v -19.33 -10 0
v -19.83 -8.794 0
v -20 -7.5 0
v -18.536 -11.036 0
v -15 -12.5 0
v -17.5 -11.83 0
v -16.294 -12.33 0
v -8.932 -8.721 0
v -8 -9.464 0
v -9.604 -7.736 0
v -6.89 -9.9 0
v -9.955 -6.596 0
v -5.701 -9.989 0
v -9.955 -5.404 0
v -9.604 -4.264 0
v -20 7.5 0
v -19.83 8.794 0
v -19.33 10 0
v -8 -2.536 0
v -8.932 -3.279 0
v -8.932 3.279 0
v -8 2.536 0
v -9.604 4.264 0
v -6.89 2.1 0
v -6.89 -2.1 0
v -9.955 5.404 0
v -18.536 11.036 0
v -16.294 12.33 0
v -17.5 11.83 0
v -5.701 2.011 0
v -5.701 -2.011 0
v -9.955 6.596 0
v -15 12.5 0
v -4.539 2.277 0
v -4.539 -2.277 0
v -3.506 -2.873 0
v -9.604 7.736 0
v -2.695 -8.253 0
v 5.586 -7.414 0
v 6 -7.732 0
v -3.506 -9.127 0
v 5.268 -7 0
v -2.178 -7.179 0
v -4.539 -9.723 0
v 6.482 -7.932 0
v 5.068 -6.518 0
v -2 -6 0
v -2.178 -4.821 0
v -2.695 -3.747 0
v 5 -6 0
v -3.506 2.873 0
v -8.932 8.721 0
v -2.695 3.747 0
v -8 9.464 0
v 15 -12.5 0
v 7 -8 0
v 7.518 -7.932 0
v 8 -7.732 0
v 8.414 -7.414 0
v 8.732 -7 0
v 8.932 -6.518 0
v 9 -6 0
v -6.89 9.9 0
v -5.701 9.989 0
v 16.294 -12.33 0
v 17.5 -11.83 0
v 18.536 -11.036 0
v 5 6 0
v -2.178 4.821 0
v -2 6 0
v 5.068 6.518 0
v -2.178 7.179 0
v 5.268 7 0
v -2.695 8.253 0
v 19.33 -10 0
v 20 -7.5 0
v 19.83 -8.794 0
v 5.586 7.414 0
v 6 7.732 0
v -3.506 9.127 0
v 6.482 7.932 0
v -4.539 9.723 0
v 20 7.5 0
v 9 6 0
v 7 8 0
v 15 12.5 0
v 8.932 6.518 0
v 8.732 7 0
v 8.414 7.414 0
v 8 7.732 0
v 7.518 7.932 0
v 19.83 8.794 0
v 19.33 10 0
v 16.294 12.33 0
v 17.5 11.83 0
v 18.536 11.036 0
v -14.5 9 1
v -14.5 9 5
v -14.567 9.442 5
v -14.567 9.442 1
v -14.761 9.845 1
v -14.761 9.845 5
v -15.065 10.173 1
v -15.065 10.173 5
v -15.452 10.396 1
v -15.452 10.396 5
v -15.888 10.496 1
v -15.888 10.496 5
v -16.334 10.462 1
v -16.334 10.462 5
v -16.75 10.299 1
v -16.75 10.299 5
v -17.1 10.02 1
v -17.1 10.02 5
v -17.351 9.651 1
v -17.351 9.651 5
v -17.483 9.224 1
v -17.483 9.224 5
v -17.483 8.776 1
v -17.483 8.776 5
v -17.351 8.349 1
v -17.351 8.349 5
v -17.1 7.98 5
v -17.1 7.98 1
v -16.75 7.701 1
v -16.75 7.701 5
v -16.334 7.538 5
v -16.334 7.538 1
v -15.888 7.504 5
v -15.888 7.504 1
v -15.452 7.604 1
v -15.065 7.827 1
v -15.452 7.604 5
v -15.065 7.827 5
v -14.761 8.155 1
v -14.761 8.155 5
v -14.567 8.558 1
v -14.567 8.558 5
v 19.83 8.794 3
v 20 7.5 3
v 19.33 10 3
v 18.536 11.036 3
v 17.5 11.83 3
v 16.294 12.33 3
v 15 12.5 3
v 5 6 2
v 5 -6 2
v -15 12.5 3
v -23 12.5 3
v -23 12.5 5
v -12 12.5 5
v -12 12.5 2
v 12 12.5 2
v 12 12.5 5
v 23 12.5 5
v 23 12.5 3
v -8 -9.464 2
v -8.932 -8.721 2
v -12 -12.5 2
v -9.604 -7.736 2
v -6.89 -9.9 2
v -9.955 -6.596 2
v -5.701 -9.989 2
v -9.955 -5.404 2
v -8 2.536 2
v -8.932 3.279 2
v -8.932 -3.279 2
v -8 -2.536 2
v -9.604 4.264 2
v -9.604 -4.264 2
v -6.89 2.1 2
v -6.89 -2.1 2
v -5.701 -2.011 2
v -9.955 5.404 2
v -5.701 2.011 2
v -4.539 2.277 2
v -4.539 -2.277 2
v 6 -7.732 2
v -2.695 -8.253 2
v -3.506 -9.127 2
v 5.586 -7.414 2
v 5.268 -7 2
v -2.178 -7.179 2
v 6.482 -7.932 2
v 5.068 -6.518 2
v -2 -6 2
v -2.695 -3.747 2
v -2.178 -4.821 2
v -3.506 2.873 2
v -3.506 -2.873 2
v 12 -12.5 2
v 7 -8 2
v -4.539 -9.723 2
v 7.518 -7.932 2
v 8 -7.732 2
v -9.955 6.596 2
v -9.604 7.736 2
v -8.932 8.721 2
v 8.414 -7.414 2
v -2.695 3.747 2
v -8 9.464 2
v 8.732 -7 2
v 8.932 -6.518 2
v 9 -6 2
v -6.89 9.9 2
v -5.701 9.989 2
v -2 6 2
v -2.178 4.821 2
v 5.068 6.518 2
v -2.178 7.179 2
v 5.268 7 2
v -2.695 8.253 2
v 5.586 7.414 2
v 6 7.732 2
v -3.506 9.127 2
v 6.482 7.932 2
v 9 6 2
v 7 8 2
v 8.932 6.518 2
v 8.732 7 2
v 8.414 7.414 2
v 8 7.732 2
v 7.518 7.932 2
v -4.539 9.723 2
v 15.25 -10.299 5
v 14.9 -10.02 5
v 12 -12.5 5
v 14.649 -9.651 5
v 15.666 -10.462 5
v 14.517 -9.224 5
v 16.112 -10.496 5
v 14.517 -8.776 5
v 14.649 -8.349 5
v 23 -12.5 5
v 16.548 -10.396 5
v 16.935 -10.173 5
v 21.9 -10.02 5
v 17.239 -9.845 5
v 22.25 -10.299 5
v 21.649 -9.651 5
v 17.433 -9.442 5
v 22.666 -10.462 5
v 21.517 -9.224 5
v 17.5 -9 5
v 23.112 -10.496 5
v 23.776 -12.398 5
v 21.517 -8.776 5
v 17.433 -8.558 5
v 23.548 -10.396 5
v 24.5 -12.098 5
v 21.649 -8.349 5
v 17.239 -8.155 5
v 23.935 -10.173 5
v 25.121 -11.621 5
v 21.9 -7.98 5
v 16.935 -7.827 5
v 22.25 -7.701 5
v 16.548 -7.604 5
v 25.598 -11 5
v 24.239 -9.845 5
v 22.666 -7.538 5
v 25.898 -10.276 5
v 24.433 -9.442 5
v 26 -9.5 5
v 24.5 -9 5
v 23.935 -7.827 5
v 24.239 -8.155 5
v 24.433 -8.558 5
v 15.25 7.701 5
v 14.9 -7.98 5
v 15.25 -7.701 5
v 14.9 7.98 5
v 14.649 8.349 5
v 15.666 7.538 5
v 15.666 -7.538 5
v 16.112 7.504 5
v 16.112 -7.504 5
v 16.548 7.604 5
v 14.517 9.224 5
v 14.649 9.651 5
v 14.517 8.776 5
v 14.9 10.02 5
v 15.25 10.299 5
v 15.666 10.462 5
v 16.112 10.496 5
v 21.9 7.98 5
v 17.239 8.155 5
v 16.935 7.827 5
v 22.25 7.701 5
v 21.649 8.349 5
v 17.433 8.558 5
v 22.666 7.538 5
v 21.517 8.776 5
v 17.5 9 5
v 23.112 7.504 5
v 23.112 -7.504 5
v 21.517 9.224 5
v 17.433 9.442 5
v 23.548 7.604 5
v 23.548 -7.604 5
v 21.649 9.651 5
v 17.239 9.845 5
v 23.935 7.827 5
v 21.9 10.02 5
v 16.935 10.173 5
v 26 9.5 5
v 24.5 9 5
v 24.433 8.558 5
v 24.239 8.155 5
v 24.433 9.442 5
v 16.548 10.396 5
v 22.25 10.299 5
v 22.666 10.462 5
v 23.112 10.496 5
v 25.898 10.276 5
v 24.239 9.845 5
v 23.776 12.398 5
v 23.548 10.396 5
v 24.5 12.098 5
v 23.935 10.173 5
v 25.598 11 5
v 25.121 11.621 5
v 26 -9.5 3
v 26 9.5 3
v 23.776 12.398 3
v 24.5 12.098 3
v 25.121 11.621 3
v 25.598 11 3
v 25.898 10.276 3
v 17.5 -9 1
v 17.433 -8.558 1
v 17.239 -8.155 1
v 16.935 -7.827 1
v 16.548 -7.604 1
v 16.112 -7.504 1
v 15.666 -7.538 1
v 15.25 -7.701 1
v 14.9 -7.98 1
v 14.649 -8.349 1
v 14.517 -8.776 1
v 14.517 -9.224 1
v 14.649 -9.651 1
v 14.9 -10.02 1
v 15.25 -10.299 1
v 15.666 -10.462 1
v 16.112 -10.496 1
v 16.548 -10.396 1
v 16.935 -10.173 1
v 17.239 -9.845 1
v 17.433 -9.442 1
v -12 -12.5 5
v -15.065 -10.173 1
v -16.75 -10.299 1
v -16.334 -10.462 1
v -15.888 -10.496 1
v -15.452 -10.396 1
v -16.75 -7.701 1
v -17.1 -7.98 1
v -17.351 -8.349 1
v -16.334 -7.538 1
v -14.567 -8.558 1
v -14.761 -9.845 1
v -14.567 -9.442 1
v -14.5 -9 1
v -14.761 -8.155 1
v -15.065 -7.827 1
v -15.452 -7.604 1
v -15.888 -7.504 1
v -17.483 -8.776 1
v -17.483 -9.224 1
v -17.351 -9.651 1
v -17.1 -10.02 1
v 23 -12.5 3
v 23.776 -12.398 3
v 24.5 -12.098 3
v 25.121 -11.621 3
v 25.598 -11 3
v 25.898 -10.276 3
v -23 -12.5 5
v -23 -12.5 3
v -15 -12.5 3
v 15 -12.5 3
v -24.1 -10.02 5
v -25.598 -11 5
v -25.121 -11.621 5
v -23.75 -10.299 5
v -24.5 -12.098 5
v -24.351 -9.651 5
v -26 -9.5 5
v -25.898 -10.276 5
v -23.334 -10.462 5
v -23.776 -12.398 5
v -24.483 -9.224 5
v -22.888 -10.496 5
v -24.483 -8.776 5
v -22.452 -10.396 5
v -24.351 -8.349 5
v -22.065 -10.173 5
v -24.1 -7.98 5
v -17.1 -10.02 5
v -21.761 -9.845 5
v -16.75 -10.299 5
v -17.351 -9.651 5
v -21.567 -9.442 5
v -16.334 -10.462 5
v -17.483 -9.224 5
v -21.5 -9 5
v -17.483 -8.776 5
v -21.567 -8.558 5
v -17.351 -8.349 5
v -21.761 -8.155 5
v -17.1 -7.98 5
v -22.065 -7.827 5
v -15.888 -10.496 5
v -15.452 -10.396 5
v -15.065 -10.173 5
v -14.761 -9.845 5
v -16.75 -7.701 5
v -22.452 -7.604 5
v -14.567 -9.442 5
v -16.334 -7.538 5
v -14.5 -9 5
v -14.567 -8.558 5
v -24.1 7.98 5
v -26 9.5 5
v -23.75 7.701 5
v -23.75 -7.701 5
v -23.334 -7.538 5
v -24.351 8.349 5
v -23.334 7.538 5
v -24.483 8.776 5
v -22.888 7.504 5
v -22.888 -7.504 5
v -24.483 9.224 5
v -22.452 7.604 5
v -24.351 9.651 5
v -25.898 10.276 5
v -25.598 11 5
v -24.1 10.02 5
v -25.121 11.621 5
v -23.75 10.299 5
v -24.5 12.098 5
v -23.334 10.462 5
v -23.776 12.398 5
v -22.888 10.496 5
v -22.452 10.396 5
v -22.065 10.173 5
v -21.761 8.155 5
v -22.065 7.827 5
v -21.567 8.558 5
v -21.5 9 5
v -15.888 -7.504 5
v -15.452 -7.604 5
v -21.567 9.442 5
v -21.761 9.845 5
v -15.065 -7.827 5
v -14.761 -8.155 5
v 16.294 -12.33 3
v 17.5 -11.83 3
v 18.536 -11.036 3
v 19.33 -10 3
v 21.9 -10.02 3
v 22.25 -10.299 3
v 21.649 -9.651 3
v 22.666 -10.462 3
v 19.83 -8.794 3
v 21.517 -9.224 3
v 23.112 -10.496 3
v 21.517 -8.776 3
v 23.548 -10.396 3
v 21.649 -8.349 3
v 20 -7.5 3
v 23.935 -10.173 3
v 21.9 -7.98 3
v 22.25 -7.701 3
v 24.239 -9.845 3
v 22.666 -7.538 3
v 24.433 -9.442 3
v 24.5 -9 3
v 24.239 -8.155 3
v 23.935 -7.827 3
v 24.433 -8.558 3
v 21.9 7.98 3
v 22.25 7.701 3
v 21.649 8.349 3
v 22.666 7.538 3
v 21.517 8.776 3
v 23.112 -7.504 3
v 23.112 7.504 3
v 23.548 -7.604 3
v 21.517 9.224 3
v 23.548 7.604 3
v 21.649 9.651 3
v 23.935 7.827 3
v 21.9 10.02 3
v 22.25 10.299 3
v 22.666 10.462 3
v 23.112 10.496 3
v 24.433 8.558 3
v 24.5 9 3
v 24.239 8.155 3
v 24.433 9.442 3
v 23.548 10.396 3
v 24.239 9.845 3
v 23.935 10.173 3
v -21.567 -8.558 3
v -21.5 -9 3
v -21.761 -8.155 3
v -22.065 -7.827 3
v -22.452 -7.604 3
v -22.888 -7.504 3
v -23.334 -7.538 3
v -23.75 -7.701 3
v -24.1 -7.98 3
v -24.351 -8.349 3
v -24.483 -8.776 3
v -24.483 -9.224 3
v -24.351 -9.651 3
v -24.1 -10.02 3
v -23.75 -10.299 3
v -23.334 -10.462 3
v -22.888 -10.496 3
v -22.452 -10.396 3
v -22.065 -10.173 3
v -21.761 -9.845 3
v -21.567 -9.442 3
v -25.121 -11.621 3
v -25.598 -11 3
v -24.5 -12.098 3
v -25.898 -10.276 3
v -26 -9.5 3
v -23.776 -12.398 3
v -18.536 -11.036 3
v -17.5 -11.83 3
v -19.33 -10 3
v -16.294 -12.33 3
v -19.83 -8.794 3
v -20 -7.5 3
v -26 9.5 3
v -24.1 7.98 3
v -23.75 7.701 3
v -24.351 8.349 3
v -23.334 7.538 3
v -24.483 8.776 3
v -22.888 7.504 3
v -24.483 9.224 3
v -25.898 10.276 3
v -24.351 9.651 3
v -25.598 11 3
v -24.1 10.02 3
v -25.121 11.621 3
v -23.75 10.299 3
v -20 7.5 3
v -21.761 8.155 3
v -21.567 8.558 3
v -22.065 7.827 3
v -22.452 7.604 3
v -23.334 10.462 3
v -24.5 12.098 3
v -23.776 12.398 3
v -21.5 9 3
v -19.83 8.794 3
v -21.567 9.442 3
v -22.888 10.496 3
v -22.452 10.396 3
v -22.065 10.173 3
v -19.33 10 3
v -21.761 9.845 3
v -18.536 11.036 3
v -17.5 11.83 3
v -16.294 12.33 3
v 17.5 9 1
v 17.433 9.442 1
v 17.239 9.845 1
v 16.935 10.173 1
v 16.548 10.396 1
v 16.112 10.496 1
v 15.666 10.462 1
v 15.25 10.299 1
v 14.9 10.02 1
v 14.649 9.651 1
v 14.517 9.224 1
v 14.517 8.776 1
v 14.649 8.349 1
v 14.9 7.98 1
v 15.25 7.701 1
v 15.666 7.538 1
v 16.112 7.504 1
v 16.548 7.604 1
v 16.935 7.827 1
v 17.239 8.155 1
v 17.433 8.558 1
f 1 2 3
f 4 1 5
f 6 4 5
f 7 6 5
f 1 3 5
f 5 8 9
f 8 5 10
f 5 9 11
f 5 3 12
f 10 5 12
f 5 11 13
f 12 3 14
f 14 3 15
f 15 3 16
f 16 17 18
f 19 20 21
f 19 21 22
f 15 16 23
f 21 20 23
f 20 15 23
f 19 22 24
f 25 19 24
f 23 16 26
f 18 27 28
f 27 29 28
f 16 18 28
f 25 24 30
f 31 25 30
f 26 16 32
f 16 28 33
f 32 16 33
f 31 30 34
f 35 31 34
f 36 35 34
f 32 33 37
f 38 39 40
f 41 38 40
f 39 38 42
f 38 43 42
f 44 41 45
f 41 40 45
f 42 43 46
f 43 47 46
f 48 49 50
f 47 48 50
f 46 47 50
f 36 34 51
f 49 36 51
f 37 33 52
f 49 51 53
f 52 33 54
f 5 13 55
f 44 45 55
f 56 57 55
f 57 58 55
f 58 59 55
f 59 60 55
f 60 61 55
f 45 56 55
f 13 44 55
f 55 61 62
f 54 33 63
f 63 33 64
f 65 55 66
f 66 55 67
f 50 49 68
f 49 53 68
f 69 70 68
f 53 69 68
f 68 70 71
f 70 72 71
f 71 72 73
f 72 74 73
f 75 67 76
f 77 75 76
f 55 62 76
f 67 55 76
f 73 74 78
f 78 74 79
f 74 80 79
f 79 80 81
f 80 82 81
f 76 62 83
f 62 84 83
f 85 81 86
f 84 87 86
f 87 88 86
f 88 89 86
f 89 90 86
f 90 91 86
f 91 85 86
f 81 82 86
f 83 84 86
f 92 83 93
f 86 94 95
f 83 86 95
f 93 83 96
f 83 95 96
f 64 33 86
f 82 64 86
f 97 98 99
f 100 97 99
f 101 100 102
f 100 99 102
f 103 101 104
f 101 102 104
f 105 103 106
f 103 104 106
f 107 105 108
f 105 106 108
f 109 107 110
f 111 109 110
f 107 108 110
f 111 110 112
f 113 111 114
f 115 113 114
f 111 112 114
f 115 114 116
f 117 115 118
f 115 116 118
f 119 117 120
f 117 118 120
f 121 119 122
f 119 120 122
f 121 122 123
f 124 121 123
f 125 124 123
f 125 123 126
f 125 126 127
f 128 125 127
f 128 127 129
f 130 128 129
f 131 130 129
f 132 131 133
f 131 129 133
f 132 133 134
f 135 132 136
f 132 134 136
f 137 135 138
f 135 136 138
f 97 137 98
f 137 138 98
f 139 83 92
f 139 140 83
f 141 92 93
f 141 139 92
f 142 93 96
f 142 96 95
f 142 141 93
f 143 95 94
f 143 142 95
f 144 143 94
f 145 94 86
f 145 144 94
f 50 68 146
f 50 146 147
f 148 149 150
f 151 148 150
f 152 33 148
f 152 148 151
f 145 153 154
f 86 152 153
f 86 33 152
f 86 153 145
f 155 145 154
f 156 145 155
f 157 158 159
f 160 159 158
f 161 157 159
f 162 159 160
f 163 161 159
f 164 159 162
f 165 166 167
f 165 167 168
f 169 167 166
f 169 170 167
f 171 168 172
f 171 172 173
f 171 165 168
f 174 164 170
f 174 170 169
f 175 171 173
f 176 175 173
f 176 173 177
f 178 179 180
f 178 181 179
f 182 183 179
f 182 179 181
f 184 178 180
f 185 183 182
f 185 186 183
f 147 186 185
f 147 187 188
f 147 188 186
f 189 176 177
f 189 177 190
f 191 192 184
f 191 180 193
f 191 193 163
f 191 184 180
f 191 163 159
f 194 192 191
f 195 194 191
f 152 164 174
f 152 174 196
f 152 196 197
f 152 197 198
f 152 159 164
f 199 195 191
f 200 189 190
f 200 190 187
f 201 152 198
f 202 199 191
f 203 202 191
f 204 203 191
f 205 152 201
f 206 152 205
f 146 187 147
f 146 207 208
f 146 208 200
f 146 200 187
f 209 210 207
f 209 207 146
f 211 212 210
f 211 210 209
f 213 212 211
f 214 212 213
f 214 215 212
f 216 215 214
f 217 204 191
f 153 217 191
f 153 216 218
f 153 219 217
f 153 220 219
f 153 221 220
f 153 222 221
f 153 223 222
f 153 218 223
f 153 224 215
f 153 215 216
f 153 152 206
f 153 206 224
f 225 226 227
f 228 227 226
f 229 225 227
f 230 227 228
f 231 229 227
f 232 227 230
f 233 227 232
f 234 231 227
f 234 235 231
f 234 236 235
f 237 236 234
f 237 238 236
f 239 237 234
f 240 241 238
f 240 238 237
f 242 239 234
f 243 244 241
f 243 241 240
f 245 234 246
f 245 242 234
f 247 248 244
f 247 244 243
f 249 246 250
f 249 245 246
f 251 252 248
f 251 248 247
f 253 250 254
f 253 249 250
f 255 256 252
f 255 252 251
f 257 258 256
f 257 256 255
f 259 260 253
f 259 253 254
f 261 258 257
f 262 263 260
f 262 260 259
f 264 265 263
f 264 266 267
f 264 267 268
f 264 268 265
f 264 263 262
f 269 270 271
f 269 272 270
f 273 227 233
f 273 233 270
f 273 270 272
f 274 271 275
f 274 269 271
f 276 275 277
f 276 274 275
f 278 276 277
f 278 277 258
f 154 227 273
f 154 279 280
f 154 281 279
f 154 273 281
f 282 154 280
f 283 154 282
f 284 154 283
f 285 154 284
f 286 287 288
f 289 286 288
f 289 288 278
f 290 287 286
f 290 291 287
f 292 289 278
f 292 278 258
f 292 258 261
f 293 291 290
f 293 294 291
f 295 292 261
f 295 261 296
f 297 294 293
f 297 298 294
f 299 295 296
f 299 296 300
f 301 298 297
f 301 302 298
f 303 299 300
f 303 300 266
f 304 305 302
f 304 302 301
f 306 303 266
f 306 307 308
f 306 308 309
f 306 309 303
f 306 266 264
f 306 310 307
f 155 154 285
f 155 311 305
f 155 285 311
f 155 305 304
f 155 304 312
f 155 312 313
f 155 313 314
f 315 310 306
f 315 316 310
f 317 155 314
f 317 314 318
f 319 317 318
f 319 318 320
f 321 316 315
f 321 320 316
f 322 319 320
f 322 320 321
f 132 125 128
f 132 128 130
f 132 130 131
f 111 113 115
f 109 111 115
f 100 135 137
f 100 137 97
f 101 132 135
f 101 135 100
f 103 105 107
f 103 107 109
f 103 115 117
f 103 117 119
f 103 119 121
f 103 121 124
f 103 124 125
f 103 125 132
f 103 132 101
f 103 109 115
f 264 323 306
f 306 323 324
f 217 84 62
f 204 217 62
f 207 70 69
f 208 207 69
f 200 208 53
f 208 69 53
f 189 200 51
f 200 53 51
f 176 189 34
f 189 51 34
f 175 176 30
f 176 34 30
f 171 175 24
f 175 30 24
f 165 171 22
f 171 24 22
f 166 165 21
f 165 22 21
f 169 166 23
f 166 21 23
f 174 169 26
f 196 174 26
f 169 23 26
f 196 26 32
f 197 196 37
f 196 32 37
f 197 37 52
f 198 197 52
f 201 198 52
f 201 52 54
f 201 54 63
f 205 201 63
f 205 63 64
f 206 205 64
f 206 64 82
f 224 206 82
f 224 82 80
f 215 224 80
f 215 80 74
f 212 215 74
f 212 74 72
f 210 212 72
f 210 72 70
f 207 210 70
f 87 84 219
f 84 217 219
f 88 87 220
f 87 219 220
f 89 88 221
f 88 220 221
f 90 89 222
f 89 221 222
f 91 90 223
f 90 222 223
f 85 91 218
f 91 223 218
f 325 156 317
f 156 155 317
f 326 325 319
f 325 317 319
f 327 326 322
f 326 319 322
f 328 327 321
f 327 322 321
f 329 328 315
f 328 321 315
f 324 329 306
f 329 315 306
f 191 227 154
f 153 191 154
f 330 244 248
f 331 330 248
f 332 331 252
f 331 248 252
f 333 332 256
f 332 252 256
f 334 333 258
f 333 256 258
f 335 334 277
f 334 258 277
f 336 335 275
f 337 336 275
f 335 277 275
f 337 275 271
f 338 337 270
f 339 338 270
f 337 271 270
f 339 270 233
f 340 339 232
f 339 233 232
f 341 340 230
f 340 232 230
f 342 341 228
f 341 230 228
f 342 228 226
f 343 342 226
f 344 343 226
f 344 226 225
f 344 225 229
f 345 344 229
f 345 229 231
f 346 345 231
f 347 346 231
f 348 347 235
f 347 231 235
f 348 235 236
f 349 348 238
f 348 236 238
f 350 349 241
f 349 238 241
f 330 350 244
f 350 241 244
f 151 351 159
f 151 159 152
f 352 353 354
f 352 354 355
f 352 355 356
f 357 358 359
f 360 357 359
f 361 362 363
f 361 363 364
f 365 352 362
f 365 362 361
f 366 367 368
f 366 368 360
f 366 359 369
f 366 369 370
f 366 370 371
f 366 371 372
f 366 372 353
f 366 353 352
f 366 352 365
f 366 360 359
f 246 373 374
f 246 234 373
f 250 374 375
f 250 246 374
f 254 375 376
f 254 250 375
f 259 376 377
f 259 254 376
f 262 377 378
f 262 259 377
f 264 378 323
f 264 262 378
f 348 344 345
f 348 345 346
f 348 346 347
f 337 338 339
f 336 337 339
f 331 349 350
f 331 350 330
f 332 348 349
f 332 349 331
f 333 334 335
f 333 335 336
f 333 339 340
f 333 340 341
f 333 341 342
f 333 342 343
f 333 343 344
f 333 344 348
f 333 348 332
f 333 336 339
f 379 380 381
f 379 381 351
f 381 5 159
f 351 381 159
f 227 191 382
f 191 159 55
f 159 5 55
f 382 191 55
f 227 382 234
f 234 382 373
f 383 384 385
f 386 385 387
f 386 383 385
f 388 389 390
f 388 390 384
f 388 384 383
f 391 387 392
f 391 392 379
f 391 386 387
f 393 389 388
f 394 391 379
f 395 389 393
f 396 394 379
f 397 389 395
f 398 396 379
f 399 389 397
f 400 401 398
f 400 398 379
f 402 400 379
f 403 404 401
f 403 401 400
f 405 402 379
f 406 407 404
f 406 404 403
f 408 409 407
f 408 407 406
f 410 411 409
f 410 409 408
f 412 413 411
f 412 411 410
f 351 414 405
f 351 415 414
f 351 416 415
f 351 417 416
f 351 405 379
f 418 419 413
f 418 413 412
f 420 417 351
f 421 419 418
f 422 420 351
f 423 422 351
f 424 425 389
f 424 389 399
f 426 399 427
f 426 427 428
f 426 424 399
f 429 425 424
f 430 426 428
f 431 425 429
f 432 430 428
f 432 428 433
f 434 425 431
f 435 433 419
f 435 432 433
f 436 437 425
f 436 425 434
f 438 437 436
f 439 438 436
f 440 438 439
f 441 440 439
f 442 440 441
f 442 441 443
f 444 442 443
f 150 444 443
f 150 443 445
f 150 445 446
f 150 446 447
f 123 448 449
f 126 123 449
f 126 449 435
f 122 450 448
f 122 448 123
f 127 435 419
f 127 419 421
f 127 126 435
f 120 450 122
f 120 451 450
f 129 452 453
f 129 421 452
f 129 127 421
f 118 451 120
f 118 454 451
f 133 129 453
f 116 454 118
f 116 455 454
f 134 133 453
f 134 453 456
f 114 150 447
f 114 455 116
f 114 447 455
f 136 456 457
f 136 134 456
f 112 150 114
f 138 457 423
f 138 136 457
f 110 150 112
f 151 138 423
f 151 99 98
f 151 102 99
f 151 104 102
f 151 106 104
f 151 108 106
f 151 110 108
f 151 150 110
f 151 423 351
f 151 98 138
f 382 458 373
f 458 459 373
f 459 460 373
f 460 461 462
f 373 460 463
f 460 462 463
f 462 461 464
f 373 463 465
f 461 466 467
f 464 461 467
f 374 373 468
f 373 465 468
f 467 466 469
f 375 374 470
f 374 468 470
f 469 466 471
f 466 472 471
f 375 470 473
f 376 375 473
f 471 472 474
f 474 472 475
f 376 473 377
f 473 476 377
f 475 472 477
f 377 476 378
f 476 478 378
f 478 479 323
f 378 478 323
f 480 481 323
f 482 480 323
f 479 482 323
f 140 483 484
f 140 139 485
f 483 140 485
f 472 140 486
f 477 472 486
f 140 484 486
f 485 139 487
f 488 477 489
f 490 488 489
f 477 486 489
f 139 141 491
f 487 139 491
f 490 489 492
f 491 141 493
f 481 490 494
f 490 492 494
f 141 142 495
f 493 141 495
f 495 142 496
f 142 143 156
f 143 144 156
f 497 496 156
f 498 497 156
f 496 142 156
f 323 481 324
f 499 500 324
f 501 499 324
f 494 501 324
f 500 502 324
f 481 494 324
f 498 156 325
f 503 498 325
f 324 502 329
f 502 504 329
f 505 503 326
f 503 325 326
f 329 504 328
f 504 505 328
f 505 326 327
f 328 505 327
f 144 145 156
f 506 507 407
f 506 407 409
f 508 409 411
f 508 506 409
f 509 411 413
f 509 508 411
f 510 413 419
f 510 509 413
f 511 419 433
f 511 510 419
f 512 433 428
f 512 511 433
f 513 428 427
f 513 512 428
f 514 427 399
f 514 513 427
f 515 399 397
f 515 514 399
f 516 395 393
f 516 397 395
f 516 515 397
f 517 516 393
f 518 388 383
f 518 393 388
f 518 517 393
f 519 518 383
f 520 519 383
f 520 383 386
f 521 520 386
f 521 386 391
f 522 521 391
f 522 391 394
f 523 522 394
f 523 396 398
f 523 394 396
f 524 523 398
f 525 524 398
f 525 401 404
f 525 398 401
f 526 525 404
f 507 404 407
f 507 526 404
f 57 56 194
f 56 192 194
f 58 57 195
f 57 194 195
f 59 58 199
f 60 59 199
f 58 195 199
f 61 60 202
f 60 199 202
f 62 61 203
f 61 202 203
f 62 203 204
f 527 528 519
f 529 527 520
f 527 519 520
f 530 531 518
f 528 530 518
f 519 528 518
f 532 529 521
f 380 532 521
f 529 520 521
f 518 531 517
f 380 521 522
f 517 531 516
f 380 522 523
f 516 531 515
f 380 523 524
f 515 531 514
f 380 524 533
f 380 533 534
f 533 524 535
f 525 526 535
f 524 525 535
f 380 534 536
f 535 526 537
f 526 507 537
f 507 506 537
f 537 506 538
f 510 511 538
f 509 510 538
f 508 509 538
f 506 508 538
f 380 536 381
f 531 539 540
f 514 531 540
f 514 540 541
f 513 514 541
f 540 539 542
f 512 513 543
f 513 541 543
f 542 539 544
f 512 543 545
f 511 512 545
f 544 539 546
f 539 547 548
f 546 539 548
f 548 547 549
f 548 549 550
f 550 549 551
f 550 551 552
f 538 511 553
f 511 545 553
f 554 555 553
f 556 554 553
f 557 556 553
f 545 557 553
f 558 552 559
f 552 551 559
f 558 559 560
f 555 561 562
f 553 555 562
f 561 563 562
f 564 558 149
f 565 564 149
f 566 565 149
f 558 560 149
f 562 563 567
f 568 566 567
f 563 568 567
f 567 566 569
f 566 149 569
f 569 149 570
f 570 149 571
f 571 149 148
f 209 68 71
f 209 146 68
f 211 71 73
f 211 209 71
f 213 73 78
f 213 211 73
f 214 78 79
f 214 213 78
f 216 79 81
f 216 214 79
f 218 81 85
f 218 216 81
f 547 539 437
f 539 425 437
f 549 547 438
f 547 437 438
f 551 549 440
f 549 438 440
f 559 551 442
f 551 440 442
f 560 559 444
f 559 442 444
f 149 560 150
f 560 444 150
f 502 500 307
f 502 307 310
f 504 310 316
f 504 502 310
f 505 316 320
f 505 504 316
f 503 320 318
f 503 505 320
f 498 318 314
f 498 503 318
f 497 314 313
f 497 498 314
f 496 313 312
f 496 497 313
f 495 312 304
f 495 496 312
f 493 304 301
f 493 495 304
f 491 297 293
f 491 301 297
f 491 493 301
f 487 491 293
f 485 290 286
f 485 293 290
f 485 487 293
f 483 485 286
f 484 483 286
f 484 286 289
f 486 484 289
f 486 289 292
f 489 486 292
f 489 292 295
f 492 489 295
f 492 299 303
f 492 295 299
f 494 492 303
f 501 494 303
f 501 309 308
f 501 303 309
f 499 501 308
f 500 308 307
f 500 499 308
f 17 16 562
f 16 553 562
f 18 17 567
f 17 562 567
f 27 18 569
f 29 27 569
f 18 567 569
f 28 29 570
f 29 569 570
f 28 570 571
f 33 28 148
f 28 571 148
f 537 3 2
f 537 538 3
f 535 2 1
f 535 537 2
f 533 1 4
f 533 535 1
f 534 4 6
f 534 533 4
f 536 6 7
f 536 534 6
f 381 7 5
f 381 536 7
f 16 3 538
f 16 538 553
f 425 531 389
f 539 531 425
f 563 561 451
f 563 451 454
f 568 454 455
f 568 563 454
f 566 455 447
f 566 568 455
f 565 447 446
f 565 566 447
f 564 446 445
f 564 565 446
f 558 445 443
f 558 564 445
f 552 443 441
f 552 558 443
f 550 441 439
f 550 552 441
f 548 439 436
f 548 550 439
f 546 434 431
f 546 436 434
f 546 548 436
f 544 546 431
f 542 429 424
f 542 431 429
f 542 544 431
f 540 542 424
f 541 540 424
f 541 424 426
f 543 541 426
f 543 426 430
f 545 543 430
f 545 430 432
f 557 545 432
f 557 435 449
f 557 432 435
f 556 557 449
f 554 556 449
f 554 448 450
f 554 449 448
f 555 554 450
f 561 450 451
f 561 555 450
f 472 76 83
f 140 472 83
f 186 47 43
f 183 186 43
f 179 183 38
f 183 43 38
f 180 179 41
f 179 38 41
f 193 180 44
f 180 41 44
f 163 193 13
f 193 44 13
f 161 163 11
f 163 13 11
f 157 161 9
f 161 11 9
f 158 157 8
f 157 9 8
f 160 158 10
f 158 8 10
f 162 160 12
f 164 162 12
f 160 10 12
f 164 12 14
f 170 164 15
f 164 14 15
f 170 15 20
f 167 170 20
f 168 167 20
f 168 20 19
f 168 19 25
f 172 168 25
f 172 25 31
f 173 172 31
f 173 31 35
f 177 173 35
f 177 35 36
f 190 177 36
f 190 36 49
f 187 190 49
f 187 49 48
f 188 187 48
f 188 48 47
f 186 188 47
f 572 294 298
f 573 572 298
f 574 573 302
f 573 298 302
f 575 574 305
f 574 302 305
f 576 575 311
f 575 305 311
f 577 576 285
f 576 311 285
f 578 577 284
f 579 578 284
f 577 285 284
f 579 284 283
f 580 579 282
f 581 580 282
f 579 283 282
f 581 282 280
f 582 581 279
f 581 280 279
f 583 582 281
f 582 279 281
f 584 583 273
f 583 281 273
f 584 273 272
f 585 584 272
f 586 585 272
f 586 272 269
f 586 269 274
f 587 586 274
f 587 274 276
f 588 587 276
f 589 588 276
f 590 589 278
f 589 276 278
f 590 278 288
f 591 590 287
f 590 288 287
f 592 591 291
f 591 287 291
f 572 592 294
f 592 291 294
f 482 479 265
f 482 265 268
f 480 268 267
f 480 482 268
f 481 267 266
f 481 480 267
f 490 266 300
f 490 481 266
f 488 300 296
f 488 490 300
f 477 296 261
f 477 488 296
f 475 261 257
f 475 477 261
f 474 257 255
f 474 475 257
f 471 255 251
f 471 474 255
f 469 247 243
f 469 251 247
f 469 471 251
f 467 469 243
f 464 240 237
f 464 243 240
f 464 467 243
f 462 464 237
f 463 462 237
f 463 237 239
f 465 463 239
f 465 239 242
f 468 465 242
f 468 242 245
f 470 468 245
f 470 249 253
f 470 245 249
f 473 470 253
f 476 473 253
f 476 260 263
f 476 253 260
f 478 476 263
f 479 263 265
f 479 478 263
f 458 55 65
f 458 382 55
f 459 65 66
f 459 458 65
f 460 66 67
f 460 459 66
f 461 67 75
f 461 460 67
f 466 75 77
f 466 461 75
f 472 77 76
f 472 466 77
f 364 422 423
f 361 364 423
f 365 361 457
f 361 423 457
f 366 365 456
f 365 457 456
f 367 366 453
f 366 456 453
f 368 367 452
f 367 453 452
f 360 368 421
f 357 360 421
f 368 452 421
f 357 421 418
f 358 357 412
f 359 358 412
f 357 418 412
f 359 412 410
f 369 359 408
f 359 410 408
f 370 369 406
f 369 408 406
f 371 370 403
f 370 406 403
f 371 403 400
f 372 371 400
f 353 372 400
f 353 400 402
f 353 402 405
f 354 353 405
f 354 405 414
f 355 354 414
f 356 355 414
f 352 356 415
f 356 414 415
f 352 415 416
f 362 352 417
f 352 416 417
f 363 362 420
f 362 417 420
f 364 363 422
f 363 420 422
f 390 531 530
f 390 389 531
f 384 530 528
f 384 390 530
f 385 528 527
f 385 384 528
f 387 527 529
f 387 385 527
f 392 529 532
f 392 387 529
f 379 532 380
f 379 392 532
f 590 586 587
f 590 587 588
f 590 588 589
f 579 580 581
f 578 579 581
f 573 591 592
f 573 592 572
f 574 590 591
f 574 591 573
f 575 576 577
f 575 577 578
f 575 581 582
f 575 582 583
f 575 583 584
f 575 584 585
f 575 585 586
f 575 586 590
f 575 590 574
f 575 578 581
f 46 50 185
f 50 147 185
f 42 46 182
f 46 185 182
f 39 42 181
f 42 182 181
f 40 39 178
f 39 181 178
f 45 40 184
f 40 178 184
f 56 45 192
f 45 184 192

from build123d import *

# Parameters (mm, degrees)
F0_W      = 40
F0_H      = 25
F1_DEPTH  = 3
F2_R      = 5
F3_W      = 52
F3_H      = 25
F4_DEPTH  = 2
F5_R      = 3
F6_R      = 1.5
F7_DEPTH  = 25
F8_R      = 1.5
F9_DEPTH  = 4
F10_W     = 24
F10_H     = 25
F11_DEPTH = 3
F12_W     = 4
F12_H     = 16
F12_R     = 4
F13_DEPTH = 25
F14_R     = 1.99999


# Not quite as in the source:
# - a fillet or chamfer is up to 0.001 mm smaller than in the source, because OpenCascade refuses the exact size


with BuildPart() as f1:
    # F0 (on Top) → F1 (new body)
    with BuildSketch(Plane.XY):
        Rectangle(F0_W, F0_H)
    extrude(amount=F1_DEPTH)

    # F2
    f2_edges = [f1.edges().sort_by_distance(p)[0] for p in [
        (-20, -12.5, 1.5),
        (-20, 12.5, 1.5),
        (20, -12.5, 1.5),
        (20, 12.5, 1.5),
    ]]
    fillet(f2_edges, radius=F2_R)

    # F3 (on face) → F4 (join)
    with BuildSketch(Plane.XY.offset(3)):
        Rectangle(F3_W, F3_H)
    extrude(amount=F4_DEPTH)

    # F5
    f5_edges = [f1.edges().sort_by_distance(p)[0] for p in [
        (26, 12.5, 4),
        (26, -12.5, 4),
        (-26, -12.5, 4),
        (-26, 12.5, 4),
    ]]
    fillet(f5_edges, radius=F5_R)

    # F6 (on Top) → F7 (cut)
    with BuildSketch(Plane.XY):
        with Locations((23, 9)):
            Circle(F6_R)
        with Locations((23, -9)):
            Circle(F6_R)
        with Locations((-23, -9)):
            Circle(F6_R)
        with Locations((-23, 9)):
            Circle(F6_R)
    extrude(amount=F7_DEPTH, mode=Mode.SUBTRACT)

    # F8 (on face) → F9 (cut)
    with BuildSketch(Plane.XY.offset(5)):
        with Locations((16, -9)):
            Circle(F8_R)
        with Locations((-16, -9)):
            Circle(F8_R)
        with Locations((-16, 9)):
            Circle(F8_R)
        with Locations((16, 9)):
            Circle(F8_R)
    extrude(amount=-F9_DEPTH, mode=Mode.SUBTRACT)

    # F10 (on face) → F11 (cut)
    with BuildSketch(Plane.XY.offset(5)):
        Rectangle(F10_W, F10_H)
    extrude(amount=-F11_DEPTH, mode=Mode.SUBTRACT)

    # F12 (on face) → F13 (cut)
    with BuildSketch(Plane(origin=(0, 0, 0), x_dir=(1, 0, 0), z_dir=(0, 0, -1))):
        with Locations((7, 0)):
            Rectangle(F12_W, F12_H)
        with Locations((-6, -6)):
            Circle(F12_R)
        with Locations((-6, 6)):
            Circle(F12_R)
    extrude(amount=-F13_DEPTH, mode=Mode.SUBTRACT)

    # F14 (radius 2 in the source; OpenCascade refuses exactly that, so slightly less here)
    f14_edges = [f1.edges().sort_by_distance(p)[0] for p in [
        (9, 8, 1),
        (5, 8, 1),
        (9, -8, 1),
        (5, -8, 1),
    ]]
    fillet(f14_edges, radius=F14_R)


solid = f1.part
